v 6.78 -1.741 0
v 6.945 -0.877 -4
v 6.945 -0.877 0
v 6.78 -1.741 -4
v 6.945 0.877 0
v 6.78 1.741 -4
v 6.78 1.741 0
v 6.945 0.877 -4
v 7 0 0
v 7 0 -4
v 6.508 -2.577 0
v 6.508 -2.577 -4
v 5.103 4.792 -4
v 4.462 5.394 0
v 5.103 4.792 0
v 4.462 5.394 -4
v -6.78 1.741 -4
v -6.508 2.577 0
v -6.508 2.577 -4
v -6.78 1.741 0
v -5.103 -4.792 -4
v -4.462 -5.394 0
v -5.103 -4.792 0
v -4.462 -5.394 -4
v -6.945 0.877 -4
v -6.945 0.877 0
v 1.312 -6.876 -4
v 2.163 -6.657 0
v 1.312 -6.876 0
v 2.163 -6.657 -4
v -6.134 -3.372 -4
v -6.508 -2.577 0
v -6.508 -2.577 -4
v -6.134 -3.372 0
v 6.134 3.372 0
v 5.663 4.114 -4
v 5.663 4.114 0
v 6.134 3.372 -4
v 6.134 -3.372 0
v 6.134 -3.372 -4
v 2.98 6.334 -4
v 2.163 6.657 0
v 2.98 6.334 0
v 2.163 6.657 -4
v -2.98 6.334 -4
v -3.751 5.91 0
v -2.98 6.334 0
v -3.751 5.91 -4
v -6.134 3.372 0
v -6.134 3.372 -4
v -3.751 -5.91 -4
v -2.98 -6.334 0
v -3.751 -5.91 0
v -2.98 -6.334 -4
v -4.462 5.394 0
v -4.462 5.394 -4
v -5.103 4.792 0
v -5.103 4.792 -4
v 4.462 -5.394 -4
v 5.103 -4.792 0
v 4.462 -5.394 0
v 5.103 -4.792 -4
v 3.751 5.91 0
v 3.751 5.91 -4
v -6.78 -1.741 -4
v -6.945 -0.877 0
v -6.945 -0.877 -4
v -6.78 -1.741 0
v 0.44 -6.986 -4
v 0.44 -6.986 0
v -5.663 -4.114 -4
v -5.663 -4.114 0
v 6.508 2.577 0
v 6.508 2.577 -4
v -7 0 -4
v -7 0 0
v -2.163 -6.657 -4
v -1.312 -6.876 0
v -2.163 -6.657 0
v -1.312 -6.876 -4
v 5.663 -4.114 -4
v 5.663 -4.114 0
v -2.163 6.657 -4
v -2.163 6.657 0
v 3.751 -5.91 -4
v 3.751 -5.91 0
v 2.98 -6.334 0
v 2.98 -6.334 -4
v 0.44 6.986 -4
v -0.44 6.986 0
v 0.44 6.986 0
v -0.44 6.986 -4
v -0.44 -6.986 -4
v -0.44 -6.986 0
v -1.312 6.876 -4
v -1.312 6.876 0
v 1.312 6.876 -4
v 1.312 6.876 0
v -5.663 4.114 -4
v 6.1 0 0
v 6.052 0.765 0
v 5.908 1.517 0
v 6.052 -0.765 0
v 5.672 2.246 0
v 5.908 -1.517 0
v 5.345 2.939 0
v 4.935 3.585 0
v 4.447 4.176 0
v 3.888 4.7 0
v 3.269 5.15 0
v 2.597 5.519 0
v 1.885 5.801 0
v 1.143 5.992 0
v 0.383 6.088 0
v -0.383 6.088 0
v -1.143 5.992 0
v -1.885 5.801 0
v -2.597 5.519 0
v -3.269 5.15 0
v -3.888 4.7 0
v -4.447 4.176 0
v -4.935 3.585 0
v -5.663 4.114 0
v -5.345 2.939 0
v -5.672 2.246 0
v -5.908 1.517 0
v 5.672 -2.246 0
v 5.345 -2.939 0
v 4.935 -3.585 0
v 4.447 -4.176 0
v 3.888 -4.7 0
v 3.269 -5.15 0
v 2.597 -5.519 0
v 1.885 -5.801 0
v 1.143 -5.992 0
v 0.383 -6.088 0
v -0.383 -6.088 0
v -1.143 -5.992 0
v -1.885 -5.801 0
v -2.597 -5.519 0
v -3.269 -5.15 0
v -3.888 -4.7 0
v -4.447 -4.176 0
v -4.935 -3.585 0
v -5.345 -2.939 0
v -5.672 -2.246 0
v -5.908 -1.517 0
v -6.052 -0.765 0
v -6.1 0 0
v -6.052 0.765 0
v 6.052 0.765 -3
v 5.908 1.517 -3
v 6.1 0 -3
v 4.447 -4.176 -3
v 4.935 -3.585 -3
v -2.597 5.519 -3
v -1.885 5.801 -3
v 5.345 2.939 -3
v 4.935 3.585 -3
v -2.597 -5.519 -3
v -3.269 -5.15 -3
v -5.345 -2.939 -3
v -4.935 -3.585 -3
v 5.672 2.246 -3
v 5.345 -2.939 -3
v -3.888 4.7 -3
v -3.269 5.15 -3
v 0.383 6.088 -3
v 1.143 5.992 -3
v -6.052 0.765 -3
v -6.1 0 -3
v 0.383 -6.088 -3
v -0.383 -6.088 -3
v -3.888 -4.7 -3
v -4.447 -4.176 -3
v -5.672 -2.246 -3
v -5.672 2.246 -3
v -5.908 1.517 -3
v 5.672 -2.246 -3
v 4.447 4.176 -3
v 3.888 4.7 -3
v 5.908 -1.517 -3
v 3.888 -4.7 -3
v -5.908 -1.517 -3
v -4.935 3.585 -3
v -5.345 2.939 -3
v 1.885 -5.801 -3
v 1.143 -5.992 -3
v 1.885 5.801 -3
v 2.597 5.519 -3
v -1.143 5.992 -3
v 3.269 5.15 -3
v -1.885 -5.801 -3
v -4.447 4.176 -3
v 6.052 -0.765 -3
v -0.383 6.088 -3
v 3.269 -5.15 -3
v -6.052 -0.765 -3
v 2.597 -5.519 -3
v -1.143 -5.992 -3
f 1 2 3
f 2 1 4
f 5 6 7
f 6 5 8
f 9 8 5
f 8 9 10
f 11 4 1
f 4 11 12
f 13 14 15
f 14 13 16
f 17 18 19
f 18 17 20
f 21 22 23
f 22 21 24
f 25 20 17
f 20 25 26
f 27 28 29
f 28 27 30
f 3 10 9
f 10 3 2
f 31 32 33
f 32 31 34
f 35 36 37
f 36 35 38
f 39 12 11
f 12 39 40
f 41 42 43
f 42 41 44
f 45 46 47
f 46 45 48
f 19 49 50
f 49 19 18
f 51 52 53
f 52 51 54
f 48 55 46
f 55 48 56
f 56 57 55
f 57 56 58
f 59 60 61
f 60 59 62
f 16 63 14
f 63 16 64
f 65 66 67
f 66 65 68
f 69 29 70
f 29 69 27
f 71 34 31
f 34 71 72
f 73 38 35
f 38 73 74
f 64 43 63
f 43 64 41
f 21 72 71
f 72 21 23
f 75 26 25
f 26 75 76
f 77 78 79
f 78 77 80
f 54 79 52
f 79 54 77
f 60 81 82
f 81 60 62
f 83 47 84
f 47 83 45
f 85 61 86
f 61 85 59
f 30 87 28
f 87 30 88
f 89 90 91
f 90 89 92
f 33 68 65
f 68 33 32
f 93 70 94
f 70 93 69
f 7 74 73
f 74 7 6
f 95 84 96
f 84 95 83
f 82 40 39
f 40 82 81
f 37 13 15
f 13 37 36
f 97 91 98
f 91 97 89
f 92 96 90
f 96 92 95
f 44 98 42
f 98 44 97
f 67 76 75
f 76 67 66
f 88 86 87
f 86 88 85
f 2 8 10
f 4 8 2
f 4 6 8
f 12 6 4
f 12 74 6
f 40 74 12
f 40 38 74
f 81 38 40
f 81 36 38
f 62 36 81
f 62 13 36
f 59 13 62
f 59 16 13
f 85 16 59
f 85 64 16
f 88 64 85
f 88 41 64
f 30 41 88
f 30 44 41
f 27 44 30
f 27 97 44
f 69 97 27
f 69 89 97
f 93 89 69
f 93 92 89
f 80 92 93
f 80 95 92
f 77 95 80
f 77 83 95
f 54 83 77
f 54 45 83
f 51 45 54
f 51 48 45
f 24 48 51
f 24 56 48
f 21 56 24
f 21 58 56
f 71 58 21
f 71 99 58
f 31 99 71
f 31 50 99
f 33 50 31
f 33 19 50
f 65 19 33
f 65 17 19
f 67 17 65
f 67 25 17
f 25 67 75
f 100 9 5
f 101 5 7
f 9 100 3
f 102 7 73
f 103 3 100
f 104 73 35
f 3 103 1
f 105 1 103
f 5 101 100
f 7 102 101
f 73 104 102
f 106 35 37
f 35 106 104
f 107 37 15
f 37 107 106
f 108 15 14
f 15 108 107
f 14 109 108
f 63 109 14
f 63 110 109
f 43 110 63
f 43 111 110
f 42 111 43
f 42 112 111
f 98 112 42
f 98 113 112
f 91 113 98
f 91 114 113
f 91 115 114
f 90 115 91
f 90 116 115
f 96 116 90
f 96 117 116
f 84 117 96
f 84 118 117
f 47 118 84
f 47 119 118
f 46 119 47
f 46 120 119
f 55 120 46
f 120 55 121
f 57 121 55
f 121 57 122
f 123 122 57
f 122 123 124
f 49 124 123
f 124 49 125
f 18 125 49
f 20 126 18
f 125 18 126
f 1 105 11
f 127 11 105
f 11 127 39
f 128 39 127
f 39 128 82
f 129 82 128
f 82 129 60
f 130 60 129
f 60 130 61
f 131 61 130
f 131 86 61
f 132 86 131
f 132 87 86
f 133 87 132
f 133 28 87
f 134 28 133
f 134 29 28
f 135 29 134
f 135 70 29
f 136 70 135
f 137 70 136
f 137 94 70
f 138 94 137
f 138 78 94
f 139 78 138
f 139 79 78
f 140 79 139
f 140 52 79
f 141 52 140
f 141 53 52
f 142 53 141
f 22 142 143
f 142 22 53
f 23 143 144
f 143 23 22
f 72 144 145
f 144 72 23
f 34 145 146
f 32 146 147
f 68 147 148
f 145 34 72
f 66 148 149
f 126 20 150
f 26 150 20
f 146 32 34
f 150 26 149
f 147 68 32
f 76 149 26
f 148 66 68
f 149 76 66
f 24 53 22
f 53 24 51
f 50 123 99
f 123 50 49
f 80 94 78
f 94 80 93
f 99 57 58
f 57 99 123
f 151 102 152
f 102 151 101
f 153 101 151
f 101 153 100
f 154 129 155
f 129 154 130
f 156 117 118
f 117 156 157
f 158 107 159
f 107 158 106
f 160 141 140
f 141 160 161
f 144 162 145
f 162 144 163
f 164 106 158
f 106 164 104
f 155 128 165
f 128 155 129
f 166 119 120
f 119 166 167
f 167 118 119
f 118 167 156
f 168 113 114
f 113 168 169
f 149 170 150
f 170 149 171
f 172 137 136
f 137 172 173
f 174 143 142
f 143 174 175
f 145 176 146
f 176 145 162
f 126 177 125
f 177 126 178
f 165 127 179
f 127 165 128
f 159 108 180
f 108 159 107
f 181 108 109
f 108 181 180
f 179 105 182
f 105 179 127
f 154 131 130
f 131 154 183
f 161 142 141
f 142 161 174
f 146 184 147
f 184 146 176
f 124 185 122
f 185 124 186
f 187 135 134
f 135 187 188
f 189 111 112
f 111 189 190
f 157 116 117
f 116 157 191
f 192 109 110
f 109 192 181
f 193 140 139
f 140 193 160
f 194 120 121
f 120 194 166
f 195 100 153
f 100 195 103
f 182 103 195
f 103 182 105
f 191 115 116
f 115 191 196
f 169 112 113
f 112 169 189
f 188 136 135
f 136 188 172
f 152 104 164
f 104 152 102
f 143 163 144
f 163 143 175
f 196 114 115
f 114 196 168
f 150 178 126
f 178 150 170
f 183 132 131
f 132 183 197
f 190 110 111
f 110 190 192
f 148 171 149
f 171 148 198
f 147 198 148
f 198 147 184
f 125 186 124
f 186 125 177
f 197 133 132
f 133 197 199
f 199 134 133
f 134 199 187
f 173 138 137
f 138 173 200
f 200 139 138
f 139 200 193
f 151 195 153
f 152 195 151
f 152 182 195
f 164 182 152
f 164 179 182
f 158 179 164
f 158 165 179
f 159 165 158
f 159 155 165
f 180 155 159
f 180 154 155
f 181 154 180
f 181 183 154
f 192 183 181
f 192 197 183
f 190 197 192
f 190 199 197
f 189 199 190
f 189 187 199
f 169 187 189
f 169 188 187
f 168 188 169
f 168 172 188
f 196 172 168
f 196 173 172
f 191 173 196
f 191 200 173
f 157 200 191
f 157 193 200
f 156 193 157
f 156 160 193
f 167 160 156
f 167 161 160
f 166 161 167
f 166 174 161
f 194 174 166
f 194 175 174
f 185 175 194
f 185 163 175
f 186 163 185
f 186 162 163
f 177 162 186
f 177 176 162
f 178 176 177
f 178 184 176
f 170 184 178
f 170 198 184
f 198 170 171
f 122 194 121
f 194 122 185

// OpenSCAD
$fn = 50;


difference() {
	union() {
		translate(v = [0, 0, -4.0000000000]) {
			cylinder(h = 4, r = 7.0000000000);
		}
	}
	union() {
		#translate(v = [0, 0, -3.0000000000]) {
			cylinder(h = 3, r = 6.1000000000);
		}
	}
}
